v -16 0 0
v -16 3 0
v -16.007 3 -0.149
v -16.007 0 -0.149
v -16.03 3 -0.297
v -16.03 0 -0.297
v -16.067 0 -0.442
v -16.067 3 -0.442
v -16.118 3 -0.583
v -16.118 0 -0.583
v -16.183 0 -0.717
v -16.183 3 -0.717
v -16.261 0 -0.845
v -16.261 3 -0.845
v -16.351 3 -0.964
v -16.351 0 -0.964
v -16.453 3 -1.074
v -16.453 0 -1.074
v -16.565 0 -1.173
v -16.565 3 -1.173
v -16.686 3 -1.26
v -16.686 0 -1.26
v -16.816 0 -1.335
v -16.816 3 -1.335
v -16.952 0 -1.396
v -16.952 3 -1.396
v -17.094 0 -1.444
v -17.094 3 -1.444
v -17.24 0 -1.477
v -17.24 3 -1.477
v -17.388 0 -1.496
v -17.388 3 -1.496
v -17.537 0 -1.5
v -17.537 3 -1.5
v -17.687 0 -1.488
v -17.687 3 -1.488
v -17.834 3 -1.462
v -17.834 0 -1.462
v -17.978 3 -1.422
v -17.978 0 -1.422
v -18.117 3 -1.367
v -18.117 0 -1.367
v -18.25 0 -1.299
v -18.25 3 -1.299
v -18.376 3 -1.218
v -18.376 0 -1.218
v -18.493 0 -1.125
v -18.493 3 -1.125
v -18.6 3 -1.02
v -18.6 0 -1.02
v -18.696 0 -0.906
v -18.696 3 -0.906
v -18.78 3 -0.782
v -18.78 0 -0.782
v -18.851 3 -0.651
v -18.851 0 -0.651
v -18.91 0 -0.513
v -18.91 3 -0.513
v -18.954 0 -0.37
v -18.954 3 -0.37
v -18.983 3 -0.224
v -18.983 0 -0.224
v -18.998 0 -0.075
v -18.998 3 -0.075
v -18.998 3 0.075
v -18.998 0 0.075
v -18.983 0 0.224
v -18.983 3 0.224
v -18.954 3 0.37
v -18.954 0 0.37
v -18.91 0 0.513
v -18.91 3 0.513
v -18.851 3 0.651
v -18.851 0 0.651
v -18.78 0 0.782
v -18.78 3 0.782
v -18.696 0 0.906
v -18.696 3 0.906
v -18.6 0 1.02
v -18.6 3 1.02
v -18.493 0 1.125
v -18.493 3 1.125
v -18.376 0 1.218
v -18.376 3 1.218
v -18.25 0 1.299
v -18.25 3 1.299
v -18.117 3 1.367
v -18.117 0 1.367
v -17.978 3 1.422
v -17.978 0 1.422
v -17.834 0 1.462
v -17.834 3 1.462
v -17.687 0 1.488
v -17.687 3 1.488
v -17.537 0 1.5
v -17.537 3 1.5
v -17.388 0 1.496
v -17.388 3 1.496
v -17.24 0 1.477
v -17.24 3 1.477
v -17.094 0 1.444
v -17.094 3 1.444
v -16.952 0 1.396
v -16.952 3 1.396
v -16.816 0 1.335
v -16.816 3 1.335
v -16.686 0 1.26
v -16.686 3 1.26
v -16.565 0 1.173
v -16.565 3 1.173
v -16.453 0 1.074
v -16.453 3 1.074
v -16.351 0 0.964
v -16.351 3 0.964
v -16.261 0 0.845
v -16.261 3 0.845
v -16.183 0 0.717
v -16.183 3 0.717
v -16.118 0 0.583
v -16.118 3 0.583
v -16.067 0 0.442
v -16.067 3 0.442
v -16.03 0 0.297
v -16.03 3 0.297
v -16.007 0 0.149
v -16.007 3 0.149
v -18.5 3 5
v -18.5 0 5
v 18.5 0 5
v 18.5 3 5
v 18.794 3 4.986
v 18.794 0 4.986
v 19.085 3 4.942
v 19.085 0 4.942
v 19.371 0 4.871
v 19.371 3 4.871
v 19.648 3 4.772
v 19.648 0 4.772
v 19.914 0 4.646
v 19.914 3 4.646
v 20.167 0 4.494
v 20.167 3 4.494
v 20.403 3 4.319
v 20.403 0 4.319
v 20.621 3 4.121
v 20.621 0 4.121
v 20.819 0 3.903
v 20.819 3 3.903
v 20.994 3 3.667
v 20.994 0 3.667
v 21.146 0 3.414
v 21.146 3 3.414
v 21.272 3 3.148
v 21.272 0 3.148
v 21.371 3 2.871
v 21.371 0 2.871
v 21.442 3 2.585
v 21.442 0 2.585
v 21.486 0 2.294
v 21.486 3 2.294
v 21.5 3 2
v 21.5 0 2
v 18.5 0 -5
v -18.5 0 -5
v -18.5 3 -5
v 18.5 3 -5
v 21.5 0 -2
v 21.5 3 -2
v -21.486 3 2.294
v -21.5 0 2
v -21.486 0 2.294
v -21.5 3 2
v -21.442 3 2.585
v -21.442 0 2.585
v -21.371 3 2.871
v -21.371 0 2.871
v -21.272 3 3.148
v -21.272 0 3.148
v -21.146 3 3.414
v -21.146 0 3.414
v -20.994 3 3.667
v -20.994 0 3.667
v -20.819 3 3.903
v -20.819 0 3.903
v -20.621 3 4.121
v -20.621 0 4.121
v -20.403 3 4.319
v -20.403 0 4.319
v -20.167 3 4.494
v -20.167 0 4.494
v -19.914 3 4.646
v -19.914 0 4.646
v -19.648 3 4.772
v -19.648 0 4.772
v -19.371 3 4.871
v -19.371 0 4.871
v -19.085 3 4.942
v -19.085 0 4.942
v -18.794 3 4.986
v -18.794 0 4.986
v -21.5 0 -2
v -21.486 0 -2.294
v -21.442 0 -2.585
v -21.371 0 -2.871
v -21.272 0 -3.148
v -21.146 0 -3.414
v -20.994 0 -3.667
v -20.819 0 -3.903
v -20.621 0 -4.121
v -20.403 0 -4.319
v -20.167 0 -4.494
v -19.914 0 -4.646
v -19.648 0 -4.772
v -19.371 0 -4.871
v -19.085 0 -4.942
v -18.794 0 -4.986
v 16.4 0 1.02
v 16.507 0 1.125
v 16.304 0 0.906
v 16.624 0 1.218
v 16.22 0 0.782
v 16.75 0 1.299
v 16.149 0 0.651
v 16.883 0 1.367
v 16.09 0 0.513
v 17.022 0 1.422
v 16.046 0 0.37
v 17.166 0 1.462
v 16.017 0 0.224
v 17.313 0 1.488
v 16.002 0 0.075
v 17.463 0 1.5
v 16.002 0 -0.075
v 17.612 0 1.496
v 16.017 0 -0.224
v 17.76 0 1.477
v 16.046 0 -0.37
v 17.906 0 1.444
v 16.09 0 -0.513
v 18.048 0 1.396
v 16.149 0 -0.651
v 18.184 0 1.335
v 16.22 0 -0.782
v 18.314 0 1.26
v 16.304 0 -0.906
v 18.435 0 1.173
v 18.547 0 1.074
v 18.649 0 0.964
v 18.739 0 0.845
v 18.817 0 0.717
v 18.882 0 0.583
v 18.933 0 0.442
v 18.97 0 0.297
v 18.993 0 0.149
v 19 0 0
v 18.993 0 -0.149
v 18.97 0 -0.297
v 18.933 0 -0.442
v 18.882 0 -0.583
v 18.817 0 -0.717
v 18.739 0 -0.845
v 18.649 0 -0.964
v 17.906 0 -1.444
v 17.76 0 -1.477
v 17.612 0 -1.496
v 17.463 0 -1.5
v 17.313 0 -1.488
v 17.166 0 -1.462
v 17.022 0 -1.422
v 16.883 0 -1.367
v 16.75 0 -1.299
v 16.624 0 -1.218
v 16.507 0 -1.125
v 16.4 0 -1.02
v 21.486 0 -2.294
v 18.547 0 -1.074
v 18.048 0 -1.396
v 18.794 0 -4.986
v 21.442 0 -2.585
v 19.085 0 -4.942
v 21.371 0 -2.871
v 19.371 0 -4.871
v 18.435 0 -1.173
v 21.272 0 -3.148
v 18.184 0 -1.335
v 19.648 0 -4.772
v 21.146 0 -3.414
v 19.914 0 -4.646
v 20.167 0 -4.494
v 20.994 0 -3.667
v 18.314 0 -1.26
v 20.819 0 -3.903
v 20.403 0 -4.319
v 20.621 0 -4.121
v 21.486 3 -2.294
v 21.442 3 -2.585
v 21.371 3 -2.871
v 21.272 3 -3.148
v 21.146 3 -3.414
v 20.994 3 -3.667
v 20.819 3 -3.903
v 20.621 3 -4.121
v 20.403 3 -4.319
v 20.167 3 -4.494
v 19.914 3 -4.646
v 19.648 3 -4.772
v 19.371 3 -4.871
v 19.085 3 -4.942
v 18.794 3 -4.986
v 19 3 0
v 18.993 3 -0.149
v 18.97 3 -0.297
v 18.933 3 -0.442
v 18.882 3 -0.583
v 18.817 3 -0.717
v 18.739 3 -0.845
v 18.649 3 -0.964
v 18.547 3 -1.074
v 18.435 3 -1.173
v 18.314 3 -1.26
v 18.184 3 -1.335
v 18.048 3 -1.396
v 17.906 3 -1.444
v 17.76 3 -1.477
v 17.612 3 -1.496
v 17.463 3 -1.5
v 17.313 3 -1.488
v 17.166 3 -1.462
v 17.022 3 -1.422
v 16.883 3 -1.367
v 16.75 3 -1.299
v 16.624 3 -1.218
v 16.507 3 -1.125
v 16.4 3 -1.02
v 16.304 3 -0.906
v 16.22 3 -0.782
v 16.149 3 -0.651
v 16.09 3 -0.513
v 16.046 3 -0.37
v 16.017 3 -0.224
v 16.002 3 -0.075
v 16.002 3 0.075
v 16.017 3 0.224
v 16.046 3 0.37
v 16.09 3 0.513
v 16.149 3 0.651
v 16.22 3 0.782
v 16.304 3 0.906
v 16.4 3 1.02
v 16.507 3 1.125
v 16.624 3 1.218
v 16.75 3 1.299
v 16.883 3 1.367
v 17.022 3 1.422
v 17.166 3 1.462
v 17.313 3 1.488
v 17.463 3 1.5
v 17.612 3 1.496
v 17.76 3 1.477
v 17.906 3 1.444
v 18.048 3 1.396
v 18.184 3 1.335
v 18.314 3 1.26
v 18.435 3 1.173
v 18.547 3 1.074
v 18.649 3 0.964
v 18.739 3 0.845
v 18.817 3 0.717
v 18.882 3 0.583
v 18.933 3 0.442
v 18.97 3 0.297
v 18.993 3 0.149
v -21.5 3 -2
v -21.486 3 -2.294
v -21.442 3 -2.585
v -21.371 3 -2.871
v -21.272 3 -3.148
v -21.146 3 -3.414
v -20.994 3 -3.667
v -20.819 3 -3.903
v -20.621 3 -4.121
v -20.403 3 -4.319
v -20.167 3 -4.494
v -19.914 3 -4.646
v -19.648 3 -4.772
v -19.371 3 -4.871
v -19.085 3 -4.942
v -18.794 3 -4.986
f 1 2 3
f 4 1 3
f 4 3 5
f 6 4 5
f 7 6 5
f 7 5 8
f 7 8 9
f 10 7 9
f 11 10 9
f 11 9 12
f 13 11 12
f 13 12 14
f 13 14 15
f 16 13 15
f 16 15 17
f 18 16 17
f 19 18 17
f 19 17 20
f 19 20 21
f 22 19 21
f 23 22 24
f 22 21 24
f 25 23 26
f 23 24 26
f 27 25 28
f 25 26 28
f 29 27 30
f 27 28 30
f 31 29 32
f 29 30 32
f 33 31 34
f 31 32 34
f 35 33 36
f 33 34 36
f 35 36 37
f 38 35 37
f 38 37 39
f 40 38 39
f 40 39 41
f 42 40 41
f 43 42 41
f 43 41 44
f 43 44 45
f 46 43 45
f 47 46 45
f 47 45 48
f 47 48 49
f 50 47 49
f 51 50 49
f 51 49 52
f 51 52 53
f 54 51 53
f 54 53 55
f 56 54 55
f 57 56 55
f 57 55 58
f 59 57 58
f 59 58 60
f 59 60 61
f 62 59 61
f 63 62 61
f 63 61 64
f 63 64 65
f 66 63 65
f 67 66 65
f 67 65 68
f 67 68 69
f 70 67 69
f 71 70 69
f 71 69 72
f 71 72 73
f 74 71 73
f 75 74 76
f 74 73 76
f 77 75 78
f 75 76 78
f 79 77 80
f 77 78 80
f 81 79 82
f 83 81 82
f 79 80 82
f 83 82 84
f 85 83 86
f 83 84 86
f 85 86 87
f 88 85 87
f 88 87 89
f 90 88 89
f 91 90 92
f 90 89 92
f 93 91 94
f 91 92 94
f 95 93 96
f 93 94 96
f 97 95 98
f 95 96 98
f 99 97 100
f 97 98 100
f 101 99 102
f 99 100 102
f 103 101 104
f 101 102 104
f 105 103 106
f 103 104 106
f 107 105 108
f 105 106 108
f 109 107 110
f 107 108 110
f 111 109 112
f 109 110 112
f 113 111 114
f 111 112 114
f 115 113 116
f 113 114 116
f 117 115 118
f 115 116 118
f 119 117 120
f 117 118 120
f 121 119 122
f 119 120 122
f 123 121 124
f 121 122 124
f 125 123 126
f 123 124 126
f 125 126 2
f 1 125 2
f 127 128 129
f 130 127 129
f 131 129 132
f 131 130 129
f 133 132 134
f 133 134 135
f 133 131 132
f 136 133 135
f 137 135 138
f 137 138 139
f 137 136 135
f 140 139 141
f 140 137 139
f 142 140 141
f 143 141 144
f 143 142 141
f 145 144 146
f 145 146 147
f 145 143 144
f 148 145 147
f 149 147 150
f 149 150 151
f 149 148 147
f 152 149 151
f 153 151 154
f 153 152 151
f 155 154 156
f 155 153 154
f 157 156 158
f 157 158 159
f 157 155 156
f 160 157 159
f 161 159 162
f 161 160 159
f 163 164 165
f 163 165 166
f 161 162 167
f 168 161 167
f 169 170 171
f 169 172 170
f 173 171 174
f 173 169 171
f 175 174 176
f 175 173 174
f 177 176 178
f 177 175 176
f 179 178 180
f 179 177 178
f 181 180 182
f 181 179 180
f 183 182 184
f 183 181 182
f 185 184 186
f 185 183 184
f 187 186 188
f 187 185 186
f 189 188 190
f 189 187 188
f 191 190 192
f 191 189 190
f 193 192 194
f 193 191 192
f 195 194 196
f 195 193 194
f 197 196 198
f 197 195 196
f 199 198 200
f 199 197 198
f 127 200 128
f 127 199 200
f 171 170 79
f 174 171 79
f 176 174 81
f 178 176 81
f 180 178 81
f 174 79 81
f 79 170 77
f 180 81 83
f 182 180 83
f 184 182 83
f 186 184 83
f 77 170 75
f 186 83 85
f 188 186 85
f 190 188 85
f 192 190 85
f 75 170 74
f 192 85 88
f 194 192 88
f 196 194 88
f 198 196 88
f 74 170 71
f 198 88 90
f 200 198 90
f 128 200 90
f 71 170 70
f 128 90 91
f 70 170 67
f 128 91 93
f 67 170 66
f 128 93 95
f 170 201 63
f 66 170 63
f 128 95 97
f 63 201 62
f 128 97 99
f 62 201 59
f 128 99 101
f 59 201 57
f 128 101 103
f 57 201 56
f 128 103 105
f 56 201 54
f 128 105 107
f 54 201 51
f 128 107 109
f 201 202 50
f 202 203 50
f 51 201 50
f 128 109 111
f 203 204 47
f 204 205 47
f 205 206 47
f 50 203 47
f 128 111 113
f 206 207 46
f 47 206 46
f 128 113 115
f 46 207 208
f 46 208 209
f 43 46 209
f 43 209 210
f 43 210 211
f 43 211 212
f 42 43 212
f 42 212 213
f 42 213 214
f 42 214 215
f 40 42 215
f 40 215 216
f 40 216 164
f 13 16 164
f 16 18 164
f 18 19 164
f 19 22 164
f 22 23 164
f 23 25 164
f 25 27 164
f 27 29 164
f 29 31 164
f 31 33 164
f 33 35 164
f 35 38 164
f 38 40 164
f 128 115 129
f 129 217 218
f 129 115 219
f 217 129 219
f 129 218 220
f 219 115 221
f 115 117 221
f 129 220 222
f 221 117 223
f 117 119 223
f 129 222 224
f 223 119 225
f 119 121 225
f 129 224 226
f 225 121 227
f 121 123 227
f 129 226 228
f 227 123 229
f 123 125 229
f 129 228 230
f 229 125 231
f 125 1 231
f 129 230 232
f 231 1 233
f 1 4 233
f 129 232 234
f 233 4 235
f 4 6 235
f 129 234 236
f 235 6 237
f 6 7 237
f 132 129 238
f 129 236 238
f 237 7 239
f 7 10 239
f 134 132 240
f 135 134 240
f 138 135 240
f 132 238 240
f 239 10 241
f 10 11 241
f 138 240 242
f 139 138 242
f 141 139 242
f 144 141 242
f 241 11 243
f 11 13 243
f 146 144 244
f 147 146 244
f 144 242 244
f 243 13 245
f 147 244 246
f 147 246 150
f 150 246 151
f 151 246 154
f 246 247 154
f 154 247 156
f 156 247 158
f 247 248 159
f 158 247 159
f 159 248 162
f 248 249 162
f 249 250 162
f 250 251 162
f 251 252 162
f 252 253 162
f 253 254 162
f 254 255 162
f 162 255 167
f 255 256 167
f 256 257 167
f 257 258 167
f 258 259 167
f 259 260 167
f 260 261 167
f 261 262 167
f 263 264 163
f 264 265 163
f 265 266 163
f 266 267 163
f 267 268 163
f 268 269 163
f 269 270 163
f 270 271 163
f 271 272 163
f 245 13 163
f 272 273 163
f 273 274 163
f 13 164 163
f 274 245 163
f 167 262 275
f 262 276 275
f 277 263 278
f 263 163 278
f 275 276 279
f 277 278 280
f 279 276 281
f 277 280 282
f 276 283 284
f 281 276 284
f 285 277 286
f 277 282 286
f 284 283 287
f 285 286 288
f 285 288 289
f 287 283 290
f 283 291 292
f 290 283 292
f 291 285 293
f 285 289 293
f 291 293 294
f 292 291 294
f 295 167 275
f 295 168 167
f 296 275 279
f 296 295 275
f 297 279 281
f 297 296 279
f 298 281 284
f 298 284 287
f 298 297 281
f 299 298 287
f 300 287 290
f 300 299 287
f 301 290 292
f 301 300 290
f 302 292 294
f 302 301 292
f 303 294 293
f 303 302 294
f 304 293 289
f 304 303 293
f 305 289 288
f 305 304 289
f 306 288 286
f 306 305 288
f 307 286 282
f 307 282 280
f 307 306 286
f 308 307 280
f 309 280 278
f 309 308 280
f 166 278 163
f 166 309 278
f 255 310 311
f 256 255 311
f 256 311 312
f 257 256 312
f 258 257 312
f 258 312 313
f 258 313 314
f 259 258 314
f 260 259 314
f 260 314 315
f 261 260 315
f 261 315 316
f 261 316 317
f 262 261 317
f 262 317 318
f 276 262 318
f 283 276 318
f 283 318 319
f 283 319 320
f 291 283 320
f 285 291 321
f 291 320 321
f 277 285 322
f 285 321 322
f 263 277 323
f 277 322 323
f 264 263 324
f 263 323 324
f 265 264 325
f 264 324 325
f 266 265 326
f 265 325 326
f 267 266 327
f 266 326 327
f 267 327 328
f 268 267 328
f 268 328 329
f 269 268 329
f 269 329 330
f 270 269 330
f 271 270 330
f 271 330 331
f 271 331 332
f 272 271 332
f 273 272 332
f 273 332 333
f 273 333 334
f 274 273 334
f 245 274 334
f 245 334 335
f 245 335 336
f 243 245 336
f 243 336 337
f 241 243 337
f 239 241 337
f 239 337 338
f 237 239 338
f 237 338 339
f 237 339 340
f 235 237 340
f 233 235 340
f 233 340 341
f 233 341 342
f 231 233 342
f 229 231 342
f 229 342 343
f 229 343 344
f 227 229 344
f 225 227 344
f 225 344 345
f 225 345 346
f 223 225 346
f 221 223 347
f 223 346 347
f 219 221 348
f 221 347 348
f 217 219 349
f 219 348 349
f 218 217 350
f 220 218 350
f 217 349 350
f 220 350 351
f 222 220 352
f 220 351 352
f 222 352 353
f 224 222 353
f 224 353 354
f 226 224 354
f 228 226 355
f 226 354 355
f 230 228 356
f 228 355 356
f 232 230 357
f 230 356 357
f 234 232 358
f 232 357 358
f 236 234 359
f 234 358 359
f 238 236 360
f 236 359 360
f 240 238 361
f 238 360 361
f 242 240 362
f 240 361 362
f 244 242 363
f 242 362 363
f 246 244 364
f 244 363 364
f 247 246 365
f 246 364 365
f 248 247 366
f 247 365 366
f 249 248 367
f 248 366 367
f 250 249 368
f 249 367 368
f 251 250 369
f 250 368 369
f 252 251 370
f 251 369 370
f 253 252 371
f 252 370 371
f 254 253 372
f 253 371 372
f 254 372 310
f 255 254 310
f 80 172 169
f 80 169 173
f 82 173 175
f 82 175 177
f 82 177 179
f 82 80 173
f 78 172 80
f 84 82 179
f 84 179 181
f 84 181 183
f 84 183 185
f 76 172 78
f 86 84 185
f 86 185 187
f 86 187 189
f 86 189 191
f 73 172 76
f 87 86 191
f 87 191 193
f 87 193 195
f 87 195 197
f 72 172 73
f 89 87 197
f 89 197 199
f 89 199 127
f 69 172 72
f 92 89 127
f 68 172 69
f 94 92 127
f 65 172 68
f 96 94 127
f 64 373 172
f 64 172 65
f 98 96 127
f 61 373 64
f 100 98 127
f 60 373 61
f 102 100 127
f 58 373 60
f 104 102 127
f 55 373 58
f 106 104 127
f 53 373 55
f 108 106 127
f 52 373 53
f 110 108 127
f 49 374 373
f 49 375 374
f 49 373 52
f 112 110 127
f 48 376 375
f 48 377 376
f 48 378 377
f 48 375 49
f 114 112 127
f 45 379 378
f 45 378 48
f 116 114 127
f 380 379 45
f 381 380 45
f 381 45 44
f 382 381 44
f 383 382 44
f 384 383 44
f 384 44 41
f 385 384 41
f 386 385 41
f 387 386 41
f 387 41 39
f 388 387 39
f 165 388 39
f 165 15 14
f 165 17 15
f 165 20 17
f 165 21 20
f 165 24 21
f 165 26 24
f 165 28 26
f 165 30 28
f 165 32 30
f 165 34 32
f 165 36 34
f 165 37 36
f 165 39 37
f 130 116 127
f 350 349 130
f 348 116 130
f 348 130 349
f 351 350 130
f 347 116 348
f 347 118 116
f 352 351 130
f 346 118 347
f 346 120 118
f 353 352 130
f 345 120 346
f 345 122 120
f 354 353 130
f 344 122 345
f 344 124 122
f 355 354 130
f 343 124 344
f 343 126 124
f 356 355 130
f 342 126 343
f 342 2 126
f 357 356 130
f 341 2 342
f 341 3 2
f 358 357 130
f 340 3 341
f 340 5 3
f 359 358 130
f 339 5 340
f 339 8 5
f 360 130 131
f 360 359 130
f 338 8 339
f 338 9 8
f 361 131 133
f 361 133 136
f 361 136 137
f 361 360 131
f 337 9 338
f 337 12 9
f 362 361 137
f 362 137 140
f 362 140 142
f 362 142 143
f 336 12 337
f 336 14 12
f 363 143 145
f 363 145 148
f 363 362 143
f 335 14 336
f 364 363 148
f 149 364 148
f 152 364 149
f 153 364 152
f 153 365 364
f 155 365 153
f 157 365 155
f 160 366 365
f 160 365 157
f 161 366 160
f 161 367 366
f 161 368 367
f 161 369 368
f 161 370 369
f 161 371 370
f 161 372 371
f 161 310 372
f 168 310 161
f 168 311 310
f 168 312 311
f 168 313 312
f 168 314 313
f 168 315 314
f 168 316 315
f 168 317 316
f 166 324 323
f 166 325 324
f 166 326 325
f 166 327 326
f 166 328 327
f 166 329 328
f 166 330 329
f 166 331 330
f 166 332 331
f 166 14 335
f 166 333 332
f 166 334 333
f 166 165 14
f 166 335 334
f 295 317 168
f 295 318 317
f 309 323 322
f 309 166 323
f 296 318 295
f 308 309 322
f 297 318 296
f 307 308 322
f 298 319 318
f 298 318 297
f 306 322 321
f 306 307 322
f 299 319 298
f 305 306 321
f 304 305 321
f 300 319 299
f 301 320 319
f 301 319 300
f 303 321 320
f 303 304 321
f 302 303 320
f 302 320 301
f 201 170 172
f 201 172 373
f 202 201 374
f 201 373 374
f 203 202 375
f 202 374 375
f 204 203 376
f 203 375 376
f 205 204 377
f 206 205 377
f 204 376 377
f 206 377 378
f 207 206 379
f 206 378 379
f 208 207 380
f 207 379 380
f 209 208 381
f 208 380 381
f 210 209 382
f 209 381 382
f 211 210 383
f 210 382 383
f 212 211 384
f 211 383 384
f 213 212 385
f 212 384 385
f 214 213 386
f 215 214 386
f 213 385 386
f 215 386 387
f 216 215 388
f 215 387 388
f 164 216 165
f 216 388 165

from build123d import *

# Parameters (mm, degrees)
SKETCH1_W             = 43
SKETCH1_H             = 10
BOSS_EXTRUDE1_DEPTH   = 3
FILLET1_R             = 3
F_3_0MM_DOWEL_HOLE1_D = 3


with BuildPart() as part:
    # Sketch1 → Boss-Extrude1 (new body)
    with BuildSketch(Plane(origin=(0, 0, 0), x_dir=(1, 0, 0), z_dir=(0, 1, 0))):
        Rectangle(SKETCH1_W, SKETCH1_H)
    extrude(amount=BOSS_EXTRUDE1_DEPTH)

    # Fillet1
    fillet1_edges = [part.edges().sort_by_distance(p)[0] for p in [
        (21.5, 1.5, 5),
        (-21.5, 1.5, 5),
        (-21.5, 1.5, -5),
        (21.5, 1.5, -5),
    ]]
    fillet(fillet1_edges, radius=FILLET1_R)

    # Ø3.0mm Dowel Hole1 (through all)
    with Locations(Plane(origin=(0, 0, 0), x_dir=(-1, 0, 0), z_dir=(0, -1, 0))):
        with Locations((-17.5, 0), (17.5, 0)):
            Hole(F_3_0MM_DOWEL_HOLE1_D / 2)


solid = part.part
